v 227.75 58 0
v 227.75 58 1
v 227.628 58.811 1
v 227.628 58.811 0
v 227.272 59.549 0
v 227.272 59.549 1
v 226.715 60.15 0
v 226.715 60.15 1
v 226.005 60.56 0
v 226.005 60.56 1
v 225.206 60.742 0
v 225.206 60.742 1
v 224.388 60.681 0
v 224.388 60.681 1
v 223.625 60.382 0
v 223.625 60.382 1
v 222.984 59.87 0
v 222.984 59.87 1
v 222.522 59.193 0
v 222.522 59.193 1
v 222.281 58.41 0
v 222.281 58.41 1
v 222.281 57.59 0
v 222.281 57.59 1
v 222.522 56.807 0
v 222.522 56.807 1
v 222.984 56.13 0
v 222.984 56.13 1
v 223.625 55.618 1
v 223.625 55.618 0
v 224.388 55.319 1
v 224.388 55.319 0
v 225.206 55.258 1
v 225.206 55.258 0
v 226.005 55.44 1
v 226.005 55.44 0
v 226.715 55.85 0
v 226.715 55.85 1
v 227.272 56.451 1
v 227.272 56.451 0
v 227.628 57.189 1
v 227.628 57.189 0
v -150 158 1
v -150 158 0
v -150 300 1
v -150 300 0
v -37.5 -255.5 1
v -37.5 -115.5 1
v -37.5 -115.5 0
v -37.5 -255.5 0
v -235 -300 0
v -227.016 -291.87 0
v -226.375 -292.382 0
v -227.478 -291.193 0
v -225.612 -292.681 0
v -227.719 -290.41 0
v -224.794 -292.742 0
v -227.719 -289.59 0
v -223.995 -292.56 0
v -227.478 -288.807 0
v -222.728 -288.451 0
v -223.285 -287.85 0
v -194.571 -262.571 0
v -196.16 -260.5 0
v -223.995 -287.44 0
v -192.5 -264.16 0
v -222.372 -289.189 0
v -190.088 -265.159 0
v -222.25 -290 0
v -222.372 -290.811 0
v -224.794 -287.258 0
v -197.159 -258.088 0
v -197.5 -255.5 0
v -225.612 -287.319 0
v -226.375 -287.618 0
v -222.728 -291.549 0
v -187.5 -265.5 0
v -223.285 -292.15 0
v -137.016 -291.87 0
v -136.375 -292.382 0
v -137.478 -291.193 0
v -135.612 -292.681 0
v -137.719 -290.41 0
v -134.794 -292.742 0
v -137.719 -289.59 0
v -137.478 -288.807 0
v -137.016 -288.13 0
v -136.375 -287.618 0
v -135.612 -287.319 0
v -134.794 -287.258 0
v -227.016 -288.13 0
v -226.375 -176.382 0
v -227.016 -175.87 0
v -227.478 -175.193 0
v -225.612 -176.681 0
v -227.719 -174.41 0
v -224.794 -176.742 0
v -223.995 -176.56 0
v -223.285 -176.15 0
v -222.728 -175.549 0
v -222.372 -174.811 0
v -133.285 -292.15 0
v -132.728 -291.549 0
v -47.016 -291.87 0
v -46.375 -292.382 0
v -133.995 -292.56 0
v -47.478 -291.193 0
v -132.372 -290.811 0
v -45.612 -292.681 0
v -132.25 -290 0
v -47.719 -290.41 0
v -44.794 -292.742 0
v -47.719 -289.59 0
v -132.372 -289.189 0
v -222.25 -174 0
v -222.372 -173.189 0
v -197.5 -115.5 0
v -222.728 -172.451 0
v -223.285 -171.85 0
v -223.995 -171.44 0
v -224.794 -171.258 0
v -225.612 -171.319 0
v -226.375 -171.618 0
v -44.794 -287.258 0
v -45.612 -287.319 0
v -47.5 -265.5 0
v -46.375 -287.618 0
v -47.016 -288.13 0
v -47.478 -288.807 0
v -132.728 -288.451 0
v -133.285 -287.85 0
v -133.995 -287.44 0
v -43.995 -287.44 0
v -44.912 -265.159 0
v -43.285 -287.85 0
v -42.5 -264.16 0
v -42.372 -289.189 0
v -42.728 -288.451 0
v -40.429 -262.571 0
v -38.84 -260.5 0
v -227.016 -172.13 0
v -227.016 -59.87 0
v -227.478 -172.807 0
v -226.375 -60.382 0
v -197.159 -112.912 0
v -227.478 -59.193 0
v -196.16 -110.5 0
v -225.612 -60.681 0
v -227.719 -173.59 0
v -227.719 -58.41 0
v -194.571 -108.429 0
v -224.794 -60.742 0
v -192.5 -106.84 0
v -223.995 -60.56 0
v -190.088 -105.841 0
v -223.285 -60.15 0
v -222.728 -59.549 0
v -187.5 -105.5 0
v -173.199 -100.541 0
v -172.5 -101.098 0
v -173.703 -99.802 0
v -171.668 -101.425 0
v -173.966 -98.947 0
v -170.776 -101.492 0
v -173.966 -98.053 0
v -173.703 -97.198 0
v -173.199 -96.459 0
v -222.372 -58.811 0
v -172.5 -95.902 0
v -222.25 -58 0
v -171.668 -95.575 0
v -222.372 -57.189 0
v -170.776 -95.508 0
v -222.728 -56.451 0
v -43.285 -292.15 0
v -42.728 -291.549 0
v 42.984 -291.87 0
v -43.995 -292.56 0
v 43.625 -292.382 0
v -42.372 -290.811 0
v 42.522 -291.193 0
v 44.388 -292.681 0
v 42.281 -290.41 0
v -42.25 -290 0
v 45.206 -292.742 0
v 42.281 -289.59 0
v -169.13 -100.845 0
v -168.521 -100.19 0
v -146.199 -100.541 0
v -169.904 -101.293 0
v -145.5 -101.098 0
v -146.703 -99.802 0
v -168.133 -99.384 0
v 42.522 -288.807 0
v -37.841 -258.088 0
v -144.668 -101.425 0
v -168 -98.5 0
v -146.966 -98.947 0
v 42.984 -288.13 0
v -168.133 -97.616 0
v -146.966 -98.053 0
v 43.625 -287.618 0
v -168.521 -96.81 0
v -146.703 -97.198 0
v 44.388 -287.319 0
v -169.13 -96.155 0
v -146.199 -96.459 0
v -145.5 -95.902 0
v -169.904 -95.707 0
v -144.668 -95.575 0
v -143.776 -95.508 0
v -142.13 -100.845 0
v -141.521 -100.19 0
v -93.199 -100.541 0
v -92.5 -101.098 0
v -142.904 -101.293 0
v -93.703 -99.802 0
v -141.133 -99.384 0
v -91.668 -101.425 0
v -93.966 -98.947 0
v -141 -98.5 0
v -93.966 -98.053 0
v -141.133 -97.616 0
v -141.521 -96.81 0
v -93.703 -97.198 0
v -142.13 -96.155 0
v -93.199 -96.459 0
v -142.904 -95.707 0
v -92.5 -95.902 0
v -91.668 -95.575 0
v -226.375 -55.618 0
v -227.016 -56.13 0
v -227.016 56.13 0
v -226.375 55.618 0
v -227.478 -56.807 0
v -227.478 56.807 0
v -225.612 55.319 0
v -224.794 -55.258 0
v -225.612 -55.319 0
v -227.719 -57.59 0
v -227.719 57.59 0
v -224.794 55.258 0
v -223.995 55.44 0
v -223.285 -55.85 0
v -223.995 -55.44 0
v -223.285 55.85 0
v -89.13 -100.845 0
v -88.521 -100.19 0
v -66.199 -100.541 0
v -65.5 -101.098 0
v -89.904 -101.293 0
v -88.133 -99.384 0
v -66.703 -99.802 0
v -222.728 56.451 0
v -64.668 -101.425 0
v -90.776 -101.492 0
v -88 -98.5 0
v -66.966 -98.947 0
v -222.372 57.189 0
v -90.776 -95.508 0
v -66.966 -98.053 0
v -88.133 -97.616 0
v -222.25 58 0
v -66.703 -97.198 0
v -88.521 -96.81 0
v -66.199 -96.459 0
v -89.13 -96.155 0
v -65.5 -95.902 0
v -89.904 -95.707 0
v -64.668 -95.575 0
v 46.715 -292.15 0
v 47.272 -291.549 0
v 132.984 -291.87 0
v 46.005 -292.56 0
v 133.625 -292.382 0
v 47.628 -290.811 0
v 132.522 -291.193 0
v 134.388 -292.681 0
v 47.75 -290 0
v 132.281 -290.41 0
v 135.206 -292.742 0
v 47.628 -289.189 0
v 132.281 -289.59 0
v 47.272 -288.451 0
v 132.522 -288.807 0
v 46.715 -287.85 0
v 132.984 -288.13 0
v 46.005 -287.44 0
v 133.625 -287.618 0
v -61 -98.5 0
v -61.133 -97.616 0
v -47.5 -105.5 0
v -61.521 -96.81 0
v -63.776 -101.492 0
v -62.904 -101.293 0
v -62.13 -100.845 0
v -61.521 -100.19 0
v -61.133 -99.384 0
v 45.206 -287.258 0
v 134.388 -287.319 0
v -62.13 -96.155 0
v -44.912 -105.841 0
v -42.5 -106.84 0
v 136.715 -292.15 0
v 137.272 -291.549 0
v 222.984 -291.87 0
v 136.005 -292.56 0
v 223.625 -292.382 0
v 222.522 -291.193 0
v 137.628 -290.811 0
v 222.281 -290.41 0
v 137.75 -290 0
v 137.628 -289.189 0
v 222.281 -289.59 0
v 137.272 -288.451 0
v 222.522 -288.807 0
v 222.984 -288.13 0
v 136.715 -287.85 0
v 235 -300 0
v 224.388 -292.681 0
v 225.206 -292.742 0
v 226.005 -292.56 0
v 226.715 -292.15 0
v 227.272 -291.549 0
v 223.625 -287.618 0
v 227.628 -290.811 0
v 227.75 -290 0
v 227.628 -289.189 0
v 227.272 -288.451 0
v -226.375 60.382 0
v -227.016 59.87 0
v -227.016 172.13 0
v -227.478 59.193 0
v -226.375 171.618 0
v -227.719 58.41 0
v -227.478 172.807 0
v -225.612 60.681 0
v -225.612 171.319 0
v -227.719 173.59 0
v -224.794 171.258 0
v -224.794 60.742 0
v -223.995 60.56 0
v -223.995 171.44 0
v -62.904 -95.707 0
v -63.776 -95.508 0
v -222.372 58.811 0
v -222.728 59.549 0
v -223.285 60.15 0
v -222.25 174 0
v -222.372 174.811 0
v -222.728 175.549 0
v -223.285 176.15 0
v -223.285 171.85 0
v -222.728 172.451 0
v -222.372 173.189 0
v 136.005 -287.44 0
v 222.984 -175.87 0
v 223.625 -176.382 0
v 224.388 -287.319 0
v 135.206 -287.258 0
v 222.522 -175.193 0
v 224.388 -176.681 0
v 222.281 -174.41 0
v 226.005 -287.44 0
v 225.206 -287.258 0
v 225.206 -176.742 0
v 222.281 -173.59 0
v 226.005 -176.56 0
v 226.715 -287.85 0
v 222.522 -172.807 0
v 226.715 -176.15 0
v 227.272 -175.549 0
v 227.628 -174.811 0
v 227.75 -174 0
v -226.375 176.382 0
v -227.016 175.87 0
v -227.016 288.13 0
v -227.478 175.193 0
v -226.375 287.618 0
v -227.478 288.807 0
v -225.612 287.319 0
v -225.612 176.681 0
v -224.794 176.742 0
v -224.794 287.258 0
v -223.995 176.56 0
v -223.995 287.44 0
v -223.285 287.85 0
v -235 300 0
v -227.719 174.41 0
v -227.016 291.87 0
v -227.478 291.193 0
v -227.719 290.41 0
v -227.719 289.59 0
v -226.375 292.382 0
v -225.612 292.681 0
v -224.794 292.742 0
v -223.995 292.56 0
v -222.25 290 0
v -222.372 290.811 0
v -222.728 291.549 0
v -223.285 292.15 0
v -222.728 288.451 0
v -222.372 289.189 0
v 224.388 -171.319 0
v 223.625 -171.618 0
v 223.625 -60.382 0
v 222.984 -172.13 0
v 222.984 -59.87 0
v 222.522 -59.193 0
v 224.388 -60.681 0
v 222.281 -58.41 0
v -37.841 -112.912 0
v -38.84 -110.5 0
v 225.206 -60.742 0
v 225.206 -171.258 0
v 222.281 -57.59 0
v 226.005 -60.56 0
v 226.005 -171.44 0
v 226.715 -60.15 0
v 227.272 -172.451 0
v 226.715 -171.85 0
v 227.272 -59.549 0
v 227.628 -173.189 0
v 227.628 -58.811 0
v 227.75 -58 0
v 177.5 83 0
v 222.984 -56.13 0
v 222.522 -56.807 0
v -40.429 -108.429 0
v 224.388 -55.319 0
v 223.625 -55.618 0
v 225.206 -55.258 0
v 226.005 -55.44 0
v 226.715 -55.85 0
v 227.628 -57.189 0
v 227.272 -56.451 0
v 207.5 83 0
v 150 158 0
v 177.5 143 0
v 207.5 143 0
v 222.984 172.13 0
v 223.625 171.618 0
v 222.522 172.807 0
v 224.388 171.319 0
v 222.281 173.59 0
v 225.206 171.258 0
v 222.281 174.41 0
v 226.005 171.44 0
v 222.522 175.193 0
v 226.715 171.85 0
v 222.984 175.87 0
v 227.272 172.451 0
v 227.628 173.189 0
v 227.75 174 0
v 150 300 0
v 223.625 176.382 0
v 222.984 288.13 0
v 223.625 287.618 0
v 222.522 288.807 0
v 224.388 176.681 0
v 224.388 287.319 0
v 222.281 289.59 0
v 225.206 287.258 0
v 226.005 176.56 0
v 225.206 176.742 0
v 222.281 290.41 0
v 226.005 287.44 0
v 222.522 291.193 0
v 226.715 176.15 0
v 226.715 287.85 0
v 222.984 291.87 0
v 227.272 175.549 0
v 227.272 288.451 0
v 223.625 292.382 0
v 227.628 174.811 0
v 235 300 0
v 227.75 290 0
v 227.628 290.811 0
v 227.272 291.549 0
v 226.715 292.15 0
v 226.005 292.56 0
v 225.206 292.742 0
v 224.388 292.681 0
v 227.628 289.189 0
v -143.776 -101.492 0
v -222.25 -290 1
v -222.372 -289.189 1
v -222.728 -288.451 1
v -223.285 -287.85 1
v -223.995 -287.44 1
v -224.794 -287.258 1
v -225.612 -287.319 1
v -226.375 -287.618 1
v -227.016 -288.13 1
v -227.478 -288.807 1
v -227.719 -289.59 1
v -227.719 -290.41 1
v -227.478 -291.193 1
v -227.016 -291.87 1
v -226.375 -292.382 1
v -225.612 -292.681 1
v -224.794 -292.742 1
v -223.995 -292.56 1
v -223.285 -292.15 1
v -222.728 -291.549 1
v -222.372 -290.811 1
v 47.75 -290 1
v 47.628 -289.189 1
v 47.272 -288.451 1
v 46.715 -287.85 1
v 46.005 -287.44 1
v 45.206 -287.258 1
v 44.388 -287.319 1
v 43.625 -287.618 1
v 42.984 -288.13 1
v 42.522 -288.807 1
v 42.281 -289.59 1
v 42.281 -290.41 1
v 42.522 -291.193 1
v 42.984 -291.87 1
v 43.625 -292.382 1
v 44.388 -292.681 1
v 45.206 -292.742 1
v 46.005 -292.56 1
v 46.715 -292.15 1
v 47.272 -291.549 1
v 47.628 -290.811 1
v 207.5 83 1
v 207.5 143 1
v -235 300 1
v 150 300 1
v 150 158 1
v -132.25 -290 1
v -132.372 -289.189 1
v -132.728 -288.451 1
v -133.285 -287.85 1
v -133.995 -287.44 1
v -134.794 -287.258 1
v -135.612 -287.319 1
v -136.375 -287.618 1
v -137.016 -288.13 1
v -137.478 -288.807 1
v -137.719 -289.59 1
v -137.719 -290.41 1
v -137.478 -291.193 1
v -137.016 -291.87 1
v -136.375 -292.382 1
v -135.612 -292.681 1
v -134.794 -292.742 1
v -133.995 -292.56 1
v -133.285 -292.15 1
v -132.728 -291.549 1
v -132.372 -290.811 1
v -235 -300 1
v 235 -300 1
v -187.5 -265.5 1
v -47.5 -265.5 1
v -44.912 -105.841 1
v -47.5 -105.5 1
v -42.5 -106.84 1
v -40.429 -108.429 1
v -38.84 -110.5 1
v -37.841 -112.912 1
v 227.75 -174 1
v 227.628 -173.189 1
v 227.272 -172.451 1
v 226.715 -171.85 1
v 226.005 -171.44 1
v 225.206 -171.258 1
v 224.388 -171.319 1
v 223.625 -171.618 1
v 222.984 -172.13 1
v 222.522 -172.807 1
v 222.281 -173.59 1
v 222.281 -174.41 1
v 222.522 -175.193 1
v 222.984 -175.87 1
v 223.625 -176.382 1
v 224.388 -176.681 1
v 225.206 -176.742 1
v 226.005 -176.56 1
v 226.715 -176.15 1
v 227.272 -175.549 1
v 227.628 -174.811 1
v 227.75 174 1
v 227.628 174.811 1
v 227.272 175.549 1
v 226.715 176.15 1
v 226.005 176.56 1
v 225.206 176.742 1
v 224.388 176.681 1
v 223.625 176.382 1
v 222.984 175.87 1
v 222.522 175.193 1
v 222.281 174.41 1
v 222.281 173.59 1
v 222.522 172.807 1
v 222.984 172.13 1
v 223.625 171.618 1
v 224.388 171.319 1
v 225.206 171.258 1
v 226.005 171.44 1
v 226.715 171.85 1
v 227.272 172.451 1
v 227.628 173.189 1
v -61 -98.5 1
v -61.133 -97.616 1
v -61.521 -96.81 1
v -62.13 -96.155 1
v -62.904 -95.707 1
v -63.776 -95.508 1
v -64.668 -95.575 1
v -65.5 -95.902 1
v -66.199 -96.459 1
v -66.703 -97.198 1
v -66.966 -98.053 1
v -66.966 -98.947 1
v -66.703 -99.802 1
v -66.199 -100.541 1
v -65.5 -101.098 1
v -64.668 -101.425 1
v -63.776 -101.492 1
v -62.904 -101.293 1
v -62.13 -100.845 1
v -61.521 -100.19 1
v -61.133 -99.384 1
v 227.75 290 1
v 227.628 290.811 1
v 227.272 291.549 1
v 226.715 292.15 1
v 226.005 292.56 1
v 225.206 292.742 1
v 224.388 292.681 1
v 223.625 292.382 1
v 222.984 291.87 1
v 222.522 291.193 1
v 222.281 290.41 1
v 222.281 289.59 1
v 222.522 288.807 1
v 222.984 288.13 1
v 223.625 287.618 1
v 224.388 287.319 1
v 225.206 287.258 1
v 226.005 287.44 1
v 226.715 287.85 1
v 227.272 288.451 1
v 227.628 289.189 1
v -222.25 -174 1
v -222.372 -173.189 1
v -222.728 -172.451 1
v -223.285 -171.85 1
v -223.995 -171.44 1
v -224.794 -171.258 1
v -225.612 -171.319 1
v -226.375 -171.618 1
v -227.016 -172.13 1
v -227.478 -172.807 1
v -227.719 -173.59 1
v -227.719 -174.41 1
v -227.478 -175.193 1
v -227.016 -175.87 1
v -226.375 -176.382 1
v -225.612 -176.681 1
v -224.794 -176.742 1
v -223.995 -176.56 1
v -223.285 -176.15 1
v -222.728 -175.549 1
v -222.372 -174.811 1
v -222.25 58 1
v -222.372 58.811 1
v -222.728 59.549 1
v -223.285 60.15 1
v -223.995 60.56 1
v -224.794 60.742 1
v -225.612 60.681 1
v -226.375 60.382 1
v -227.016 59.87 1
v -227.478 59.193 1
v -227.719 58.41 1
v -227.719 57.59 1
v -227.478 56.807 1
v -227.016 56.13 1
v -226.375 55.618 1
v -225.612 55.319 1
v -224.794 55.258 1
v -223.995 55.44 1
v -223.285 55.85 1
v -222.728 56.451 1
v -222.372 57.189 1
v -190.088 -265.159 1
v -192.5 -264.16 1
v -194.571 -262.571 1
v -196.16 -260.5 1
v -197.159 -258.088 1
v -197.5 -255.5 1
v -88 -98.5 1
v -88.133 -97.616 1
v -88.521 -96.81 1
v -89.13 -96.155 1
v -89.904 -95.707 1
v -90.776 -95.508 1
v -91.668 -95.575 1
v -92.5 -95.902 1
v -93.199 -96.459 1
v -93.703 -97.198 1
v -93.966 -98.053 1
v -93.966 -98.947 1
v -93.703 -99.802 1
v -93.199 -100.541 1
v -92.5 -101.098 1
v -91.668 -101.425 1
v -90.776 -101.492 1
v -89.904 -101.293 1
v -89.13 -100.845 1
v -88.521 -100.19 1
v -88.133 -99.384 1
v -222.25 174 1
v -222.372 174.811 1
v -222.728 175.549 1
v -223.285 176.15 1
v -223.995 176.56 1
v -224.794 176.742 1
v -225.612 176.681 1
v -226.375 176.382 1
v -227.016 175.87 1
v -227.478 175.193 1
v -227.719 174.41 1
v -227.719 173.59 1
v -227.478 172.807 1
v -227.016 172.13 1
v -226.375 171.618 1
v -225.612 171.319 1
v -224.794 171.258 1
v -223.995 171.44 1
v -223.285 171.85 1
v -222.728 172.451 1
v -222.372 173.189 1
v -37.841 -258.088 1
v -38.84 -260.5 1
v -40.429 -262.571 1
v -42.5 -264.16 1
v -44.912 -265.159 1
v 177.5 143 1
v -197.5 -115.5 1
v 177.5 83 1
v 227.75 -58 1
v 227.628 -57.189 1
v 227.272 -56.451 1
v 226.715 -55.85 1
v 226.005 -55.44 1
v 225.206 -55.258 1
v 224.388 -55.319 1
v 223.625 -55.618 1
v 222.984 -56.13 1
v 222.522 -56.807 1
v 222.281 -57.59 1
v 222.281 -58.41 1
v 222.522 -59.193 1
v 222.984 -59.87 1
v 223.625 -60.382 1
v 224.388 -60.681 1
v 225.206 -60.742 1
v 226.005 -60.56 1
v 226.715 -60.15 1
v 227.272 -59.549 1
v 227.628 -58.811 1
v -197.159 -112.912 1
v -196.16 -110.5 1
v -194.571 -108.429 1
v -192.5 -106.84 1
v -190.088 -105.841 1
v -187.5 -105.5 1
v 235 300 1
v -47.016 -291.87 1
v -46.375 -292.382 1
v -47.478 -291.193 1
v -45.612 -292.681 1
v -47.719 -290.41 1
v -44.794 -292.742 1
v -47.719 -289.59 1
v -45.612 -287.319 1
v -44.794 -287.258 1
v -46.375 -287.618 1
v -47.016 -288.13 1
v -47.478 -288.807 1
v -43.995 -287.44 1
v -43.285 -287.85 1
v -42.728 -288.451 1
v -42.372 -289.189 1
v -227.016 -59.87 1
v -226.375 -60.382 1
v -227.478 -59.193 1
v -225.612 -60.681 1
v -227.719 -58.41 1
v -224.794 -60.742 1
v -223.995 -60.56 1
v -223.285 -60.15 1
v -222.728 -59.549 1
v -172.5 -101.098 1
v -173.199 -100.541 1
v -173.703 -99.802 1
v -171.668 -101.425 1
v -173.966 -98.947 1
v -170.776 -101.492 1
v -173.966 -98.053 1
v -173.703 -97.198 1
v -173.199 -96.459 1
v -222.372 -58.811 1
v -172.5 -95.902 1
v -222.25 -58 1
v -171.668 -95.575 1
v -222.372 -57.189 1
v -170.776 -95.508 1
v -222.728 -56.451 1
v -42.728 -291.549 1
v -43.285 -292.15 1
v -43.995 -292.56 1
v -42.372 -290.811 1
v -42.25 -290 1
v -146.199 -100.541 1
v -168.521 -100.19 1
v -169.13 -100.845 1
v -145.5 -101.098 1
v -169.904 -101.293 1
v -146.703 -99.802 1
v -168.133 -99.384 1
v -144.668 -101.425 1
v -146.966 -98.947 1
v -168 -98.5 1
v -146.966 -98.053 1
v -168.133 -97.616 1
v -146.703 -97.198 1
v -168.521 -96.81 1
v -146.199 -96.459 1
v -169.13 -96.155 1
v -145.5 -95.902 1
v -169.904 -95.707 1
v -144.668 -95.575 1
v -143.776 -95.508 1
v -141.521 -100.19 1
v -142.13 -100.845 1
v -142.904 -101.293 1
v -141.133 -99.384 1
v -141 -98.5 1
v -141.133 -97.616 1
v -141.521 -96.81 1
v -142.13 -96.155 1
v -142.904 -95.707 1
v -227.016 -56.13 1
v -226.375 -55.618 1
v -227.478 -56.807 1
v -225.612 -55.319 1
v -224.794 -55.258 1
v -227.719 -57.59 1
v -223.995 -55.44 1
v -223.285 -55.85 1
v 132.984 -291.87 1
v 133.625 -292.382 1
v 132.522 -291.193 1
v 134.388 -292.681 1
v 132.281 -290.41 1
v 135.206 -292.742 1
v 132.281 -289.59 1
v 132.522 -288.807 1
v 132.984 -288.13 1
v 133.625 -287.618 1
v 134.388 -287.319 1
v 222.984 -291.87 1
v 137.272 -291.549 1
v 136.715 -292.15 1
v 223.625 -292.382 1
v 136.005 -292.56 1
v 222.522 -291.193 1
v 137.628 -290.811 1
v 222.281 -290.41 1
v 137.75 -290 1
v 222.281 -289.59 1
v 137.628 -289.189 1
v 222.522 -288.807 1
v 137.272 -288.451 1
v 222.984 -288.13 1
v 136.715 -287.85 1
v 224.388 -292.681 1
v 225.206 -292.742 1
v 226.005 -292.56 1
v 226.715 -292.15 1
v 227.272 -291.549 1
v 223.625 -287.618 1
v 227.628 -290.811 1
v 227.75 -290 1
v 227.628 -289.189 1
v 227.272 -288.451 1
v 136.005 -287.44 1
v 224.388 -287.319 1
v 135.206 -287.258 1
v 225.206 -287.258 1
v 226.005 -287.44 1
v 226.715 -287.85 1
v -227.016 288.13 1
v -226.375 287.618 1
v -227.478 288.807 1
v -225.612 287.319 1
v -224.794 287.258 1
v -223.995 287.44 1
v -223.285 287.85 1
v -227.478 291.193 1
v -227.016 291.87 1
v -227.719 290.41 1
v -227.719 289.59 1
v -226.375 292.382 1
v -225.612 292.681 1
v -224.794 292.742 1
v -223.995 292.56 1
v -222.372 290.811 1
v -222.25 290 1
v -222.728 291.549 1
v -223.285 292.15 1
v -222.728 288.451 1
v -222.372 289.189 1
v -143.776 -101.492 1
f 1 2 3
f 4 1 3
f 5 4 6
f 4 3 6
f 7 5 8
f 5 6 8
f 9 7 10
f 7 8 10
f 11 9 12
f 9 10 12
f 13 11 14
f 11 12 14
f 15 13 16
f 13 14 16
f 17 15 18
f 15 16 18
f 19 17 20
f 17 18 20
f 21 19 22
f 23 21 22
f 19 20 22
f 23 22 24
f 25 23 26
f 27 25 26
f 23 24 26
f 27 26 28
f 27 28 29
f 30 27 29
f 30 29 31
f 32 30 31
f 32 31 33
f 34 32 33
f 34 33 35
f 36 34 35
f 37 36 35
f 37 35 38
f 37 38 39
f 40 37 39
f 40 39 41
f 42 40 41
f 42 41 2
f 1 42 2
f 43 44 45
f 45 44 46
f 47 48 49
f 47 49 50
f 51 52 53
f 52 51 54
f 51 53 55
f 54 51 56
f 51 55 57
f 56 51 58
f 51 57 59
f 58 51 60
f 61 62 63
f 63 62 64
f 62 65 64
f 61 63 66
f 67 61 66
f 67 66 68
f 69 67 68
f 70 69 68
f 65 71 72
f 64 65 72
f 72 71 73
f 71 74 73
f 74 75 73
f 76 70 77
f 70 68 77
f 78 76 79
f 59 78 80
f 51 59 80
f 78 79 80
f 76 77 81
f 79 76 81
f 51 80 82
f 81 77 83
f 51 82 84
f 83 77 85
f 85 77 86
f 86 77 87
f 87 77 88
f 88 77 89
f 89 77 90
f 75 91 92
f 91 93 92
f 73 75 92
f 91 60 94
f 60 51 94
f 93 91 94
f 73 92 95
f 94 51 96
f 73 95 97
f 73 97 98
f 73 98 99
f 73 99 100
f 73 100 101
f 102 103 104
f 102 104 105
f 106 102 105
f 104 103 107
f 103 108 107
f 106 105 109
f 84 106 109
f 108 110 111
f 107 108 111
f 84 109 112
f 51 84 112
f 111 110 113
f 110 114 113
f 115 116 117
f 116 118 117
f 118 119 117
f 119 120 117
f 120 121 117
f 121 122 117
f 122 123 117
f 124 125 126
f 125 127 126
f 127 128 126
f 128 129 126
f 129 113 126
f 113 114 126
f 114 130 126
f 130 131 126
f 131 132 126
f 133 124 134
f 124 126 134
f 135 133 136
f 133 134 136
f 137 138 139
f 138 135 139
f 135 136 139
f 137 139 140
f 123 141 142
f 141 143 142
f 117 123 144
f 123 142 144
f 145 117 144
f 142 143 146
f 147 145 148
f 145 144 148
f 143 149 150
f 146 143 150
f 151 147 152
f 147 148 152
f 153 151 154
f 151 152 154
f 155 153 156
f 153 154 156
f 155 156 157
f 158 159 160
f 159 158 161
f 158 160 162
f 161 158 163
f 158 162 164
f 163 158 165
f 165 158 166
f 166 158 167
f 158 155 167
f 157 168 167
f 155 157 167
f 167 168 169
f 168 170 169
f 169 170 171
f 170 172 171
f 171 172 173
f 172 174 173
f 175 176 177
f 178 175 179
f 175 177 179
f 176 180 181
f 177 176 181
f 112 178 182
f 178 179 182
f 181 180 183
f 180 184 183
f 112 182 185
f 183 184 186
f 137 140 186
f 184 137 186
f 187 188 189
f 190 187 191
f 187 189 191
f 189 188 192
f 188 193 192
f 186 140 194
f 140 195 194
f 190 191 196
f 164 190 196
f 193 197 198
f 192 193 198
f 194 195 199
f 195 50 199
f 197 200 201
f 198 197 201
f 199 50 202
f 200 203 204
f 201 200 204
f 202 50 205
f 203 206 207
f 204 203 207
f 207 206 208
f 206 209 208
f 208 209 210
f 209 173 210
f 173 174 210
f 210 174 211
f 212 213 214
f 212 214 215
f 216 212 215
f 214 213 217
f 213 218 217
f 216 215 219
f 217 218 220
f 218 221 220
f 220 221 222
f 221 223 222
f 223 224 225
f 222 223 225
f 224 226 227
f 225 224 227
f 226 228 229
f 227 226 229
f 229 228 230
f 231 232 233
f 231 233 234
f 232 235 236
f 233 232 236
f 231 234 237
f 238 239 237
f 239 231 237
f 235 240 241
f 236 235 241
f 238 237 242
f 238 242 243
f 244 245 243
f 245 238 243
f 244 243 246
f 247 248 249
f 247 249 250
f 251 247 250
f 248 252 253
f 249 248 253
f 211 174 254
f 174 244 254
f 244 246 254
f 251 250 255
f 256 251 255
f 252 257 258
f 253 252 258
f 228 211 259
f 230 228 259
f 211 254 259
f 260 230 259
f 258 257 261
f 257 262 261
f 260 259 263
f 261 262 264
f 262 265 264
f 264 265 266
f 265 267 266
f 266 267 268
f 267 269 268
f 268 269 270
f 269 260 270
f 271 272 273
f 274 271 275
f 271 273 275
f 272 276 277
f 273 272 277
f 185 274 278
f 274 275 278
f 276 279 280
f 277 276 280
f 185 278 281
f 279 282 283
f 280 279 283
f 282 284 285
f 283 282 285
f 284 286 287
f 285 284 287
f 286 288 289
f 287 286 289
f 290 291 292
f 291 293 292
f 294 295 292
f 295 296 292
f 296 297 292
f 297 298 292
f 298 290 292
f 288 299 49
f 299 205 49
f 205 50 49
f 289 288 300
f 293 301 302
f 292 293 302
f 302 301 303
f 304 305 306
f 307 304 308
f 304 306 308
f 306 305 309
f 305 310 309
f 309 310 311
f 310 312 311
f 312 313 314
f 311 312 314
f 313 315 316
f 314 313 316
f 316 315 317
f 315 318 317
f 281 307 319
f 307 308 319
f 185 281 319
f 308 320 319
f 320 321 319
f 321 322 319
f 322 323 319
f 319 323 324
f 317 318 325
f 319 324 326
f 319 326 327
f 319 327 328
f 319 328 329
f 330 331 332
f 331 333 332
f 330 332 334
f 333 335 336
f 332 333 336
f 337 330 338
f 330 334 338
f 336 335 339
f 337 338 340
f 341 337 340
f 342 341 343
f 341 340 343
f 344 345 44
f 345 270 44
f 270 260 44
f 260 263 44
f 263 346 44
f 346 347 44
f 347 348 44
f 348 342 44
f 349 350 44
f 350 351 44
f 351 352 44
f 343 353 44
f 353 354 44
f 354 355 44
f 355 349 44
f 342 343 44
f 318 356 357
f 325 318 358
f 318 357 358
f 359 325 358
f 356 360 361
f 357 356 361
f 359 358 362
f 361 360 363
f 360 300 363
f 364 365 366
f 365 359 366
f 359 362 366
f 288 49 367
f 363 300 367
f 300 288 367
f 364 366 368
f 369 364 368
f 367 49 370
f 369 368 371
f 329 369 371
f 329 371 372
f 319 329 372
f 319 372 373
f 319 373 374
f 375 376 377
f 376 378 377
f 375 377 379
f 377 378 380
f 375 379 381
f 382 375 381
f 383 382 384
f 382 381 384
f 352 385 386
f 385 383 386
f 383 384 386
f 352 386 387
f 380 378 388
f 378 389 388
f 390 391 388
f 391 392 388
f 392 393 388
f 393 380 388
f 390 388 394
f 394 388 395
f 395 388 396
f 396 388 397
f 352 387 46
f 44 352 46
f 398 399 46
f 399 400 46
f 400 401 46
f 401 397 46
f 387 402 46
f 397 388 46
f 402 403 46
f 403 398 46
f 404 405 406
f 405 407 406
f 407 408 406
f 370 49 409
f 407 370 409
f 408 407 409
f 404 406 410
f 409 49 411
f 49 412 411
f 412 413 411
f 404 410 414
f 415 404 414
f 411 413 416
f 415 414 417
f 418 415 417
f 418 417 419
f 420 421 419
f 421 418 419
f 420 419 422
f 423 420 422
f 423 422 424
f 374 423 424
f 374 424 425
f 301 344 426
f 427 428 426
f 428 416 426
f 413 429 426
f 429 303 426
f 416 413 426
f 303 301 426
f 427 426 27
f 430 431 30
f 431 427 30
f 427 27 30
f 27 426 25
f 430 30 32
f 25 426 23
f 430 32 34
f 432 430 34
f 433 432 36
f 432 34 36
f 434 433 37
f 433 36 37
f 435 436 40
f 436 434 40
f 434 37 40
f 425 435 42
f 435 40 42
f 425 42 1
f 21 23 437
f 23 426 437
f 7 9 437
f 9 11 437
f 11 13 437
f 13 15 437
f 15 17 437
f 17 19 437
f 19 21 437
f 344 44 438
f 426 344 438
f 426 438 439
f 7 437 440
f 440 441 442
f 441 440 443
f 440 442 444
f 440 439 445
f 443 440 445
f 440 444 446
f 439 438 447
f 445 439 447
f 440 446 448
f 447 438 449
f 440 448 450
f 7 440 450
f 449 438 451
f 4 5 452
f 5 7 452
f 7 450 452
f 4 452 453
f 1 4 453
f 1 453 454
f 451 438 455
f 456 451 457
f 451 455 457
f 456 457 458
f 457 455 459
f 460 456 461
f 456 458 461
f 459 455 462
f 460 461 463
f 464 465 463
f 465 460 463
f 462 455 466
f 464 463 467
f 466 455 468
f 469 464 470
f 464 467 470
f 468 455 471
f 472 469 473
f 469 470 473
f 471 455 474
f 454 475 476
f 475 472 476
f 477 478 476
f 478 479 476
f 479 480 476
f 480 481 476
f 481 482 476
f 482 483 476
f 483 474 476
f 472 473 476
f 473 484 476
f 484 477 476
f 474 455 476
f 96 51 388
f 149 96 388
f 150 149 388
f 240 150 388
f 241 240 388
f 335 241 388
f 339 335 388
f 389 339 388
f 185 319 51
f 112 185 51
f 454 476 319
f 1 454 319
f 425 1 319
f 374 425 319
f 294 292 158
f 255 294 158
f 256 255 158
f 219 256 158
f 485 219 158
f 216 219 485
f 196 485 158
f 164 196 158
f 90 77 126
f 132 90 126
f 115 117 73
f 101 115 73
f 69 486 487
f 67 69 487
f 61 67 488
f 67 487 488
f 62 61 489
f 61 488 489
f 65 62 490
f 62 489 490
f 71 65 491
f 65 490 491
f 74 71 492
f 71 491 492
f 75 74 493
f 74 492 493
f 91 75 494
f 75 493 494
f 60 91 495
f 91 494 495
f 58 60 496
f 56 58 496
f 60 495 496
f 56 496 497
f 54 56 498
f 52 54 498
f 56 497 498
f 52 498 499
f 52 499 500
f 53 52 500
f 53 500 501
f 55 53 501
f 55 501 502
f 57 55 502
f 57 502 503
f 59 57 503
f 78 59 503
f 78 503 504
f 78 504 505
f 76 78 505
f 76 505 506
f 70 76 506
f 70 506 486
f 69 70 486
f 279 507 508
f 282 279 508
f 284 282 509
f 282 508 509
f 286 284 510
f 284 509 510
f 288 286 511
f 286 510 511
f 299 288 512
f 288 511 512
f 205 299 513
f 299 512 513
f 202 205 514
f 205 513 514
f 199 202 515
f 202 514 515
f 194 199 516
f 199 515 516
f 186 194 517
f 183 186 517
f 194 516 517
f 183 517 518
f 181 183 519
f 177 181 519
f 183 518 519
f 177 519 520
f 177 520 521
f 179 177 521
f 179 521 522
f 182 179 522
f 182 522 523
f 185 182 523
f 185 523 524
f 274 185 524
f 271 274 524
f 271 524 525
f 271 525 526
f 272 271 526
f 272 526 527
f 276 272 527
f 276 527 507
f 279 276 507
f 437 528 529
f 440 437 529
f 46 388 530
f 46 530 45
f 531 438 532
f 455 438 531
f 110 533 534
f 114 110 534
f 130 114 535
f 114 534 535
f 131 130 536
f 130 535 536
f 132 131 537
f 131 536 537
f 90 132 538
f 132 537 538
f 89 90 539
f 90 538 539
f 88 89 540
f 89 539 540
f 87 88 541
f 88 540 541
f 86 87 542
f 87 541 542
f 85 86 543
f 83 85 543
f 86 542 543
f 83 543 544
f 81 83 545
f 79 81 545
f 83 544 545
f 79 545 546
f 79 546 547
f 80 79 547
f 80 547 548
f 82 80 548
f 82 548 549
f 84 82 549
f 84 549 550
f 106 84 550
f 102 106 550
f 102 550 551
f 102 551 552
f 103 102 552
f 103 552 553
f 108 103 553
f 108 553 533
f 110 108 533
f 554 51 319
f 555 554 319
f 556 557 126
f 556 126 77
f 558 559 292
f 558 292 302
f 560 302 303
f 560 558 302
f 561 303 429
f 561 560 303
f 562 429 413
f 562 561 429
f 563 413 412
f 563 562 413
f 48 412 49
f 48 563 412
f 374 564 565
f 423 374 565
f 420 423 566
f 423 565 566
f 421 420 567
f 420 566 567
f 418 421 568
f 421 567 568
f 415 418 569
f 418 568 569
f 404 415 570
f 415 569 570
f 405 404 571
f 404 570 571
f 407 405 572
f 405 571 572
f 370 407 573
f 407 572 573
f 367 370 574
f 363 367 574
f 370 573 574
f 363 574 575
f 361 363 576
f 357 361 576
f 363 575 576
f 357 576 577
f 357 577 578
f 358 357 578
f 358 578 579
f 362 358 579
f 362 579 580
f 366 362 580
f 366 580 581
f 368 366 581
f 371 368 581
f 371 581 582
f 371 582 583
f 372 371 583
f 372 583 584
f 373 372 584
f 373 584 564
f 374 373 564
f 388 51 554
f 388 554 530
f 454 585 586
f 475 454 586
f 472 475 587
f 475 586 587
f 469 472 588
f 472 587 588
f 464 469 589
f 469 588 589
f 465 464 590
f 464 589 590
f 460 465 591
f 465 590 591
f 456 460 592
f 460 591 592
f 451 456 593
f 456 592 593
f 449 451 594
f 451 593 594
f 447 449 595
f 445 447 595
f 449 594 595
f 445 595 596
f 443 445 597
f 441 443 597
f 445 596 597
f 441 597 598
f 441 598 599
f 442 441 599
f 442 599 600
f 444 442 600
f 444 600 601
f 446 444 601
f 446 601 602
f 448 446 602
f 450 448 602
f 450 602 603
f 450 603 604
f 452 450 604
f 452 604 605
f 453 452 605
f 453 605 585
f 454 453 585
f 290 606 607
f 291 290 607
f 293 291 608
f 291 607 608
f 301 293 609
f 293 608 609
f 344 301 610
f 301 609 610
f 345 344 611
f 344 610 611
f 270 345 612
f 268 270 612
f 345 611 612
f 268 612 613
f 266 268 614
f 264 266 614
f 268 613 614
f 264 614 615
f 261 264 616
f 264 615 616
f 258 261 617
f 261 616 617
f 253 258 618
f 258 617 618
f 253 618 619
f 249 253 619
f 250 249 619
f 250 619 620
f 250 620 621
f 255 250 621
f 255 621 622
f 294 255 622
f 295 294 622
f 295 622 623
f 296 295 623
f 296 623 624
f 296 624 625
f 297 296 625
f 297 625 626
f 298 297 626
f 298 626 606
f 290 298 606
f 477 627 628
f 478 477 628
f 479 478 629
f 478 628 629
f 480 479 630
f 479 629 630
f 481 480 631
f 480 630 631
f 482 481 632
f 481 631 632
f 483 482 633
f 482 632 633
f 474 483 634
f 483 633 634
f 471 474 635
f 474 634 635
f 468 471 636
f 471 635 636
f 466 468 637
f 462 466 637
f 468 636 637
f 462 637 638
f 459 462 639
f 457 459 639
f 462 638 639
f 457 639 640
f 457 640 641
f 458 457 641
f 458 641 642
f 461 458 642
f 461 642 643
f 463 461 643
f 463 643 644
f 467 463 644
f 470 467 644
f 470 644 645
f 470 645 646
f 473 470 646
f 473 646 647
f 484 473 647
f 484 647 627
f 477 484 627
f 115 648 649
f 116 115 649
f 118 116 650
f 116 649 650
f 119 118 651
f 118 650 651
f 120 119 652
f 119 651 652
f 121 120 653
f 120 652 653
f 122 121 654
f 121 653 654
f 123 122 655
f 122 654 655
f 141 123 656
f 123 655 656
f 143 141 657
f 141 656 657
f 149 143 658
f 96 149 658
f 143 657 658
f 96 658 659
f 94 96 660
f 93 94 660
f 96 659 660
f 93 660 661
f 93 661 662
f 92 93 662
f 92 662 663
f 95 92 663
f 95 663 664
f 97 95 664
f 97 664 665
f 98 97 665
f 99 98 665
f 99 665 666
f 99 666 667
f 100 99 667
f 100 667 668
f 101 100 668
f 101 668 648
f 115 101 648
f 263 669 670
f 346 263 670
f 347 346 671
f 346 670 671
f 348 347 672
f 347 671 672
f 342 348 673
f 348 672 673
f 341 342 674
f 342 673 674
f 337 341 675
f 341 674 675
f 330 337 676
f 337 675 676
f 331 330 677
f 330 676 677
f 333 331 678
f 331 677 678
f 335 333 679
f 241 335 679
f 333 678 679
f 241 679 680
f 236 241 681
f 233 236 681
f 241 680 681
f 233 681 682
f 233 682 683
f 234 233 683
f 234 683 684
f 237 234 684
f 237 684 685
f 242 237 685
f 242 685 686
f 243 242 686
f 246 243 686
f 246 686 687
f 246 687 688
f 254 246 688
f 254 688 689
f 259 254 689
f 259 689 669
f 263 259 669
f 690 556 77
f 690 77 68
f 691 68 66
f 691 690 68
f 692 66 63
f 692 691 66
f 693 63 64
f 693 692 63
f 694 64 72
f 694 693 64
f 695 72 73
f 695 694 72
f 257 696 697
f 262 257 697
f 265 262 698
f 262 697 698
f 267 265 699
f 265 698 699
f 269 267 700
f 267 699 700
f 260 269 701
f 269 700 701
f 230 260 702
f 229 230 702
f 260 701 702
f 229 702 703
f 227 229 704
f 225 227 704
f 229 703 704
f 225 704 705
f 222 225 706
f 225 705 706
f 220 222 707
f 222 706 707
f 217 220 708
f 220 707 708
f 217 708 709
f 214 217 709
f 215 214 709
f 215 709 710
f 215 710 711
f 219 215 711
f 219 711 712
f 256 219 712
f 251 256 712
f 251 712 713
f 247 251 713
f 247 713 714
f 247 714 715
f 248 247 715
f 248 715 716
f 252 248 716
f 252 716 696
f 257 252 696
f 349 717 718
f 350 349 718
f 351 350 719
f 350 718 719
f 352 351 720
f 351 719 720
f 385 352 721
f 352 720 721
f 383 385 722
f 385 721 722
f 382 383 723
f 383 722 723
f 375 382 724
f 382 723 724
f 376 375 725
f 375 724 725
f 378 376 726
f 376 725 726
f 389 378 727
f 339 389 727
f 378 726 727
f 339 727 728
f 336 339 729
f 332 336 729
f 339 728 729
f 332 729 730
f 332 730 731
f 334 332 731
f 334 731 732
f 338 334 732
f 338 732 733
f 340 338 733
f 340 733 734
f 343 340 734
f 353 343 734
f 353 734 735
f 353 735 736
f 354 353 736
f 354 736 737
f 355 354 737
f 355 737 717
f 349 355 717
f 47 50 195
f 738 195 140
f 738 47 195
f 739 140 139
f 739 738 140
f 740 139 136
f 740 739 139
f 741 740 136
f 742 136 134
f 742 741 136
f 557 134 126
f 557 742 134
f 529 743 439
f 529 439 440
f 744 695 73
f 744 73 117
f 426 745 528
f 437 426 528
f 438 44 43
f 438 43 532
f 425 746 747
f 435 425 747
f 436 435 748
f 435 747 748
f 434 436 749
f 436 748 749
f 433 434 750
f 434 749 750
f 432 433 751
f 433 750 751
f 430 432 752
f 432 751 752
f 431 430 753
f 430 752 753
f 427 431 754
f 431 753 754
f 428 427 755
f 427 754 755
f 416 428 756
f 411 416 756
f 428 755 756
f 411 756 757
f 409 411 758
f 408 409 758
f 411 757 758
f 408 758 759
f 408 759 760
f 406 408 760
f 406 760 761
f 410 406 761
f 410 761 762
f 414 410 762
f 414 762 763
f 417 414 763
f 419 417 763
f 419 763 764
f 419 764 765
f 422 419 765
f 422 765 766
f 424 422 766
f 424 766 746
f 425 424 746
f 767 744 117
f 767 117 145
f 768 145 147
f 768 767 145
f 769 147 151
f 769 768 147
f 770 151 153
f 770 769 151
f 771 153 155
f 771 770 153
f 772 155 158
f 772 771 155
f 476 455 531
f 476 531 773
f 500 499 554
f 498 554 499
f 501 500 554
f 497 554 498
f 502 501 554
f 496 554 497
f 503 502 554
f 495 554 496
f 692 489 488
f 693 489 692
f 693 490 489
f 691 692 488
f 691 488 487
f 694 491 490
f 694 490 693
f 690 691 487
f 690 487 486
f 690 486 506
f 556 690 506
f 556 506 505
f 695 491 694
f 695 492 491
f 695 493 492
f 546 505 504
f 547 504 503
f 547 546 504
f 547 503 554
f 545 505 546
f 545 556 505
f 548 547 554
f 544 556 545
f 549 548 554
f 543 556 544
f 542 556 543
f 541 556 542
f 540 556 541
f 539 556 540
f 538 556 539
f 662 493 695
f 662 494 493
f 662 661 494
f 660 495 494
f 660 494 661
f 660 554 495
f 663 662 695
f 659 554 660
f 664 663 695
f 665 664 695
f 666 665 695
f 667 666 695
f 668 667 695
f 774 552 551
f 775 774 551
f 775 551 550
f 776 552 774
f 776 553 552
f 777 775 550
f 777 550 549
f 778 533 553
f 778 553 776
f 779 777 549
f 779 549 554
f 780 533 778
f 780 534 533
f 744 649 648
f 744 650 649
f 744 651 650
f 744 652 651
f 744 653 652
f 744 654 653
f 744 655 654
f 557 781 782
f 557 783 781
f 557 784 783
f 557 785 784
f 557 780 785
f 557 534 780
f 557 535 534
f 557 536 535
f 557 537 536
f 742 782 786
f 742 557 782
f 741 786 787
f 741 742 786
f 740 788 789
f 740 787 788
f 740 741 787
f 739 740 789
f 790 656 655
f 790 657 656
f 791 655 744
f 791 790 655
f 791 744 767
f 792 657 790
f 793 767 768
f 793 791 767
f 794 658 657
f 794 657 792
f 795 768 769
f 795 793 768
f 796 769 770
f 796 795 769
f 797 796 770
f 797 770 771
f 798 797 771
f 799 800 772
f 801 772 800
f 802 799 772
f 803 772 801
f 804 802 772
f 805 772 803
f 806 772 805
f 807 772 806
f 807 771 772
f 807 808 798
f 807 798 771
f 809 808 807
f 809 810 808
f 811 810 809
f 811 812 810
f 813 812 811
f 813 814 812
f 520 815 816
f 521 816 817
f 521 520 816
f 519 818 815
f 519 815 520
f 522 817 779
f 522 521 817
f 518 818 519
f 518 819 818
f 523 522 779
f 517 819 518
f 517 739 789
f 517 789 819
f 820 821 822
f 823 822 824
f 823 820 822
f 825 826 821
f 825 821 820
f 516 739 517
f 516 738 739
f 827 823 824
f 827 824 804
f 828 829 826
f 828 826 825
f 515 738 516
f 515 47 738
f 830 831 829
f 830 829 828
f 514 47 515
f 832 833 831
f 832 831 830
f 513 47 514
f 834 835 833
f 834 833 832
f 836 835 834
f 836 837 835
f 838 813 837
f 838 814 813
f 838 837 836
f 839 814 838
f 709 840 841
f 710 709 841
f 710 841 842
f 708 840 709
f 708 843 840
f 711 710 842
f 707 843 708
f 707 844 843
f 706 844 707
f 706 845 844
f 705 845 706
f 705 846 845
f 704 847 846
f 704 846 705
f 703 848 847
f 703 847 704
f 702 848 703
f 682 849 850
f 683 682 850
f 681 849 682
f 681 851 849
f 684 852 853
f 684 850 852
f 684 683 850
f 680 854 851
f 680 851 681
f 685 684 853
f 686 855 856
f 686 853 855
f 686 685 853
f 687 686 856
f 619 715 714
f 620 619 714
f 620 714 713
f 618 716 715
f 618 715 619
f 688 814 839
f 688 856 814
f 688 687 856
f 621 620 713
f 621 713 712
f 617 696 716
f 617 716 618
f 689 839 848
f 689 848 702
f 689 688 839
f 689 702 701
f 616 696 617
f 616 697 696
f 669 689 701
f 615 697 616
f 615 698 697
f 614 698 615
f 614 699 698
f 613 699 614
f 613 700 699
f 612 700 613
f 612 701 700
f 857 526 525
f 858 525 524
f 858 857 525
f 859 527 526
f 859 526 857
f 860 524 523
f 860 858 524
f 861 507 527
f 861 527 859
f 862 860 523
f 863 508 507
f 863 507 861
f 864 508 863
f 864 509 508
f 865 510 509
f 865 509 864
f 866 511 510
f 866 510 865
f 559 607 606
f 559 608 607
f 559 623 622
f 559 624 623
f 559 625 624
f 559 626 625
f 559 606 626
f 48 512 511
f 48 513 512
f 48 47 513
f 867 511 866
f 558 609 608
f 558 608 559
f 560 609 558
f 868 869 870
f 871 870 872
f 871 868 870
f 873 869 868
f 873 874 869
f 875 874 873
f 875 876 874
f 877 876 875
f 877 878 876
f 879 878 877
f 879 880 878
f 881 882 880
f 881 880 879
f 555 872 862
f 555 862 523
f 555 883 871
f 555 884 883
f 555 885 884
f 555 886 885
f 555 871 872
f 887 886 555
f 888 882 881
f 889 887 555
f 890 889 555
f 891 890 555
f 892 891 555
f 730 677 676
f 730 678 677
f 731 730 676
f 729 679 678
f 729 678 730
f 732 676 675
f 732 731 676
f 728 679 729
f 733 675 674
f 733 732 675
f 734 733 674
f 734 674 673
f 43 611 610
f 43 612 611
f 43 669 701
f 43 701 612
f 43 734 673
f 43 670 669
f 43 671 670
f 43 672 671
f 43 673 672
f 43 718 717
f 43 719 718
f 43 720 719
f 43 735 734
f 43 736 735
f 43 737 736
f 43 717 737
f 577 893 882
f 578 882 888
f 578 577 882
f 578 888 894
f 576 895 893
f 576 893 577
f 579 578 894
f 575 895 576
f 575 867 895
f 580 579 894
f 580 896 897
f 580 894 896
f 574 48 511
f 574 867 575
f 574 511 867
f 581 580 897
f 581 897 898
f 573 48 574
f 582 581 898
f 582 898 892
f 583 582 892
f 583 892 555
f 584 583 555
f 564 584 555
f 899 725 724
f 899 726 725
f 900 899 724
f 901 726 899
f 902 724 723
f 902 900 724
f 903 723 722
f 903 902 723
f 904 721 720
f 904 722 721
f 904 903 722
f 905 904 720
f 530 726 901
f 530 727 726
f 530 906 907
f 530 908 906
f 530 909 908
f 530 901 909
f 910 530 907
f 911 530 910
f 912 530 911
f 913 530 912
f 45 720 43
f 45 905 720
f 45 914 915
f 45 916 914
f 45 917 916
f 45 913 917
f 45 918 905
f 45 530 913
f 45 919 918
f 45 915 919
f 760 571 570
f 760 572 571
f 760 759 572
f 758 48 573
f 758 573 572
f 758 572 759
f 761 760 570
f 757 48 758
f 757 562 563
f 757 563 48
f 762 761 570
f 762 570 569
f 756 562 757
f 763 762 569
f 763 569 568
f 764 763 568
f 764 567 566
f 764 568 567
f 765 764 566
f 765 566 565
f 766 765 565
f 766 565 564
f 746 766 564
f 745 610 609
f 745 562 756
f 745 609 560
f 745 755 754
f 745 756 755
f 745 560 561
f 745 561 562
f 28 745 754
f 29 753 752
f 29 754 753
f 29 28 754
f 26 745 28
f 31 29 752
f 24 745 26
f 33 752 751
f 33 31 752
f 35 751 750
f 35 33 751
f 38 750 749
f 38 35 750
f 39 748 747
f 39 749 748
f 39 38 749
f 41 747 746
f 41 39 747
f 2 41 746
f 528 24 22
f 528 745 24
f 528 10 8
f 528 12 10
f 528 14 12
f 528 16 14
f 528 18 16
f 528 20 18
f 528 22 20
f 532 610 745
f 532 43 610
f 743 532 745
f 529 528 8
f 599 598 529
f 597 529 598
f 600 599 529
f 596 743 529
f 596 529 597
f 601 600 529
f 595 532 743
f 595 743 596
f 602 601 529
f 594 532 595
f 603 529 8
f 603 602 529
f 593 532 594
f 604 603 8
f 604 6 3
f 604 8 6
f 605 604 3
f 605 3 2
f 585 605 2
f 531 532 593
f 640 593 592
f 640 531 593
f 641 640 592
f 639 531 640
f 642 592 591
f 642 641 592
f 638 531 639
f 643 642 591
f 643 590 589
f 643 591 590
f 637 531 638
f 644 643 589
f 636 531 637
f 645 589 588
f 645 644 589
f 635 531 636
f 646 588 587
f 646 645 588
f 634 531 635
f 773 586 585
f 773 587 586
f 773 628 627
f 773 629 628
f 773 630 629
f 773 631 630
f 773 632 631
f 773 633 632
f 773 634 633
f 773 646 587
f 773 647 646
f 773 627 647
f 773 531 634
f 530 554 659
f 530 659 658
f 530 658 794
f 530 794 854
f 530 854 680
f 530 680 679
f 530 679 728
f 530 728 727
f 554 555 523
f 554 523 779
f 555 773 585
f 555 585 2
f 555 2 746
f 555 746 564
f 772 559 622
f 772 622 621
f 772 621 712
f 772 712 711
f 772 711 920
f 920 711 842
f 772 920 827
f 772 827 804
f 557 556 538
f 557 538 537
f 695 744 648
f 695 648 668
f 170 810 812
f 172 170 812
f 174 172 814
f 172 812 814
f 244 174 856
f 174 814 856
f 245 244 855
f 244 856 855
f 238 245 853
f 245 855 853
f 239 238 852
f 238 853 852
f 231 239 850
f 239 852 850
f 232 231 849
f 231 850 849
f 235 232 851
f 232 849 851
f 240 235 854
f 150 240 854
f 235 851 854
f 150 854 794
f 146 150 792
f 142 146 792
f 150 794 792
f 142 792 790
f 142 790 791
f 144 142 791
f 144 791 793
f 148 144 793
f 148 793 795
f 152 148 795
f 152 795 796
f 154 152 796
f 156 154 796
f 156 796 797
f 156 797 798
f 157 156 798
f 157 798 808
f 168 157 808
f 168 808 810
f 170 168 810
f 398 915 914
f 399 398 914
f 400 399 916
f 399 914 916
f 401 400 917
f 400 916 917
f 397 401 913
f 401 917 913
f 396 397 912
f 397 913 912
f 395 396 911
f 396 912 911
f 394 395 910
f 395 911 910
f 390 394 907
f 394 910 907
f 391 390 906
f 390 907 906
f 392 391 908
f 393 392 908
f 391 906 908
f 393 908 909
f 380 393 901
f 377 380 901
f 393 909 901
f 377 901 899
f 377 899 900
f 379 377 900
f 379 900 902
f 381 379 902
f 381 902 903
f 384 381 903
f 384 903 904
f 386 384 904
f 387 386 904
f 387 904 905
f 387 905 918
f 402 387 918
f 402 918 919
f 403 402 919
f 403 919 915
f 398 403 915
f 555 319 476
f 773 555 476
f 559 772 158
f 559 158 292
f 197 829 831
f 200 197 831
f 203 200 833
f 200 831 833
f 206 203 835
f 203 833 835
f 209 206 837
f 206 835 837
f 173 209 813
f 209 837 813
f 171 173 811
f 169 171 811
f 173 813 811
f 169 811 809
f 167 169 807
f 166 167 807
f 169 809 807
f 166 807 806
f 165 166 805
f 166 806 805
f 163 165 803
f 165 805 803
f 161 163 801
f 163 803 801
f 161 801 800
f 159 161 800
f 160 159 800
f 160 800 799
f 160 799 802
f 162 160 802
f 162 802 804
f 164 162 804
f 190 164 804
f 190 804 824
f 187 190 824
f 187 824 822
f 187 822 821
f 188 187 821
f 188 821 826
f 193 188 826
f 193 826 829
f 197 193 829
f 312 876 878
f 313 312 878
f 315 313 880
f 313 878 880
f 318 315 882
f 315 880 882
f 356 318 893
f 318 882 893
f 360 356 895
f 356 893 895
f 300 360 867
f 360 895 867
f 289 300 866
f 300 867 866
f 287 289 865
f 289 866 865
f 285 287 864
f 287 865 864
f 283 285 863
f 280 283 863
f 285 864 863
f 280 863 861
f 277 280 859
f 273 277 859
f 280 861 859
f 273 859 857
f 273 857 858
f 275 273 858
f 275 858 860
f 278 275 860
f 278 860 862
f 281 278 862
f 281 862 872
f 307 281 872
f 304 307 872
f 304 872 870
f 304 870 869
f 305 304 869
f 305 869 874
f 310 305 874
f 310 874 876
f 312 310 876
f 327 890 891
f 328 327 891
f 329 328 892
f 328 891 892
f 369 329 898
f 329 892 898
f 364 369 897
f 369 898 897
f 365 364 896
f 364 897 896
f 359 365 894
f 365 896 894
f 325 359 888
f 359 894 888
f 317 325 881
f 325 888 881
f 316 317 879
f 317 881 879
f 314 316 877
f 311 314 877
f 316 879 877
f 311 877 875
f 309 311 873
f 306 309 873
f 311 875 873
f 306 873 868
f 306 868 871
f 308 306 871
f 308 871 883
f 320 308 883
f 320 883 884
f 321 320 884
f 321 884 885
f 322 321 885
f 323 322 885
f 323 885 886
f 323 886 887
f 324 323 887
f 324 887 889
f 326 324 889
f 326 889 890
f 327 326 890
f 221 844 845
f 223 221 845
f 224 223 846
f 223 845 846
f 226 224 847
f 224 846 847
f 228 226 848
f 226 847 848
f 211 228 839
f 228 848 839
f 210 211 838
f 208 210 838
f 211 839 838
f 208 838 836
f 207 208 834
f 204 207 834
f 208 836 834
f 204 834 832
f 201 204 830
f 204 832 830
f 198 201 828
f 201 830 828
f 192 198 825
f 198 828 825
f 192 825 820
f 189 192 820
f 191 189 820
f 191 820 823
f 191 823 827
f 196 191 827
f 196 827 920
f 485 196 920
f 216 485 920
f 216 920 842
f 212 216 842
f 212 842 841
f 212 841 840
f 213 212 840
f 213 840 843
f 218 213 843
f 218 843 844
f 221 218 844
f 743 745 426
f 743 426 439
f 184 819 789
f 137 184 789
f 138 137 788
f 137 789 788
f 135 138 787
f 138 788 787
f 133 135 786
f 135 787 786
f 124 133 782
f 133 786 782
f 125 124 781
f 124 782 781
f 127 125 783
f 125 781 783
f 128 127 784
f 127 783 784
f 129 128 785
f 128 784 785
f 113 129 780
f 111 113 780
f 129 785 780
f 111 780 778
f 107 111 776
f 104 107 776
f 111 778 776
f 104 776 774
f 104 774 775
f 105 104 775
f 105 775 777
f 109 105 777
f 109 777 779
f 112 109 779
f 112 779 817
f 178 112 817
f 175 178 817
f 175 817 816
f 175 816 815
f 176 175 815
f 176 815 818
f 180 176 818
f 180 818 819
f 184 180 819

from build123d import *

# Parameters (mm, degrees)
SKETCH_1_W          = 470
SKETCH_1_H          = 600
EXTRUDE_1_DEPTH     = 1
HOLE_WIZARD_M5_1_D  = 5.5
SKETCH_1_3_W        = 300
SKETCH_1_3_H        = 142
CUT_EXTRUDE_3_DEPTH = 10
SKETCH_4_W          = 30
SKETCH_4_H          = 60
CUT_EXTRUDE_4_DEPTH = 10
SKETCH_5_R          = 3
CUT_EXTRUDE_5_DEPTH = 10


with BuildPart() as part:
    # 스케치1 → 보스-돌출1 (new body)
    with BuildSketch(Plane.XY):
        Rectangle(SKETCH_1_W, SKETCH_1_H)
    extrude(amount=EXTRUDE_1_DEPTH)

    # M5 여유 구멍1 (through all)
    with Locations(Plane(origin=(0, 0, 0), x_dir=(-1, 0, 0), z_dir=(0, 0, -1))):
        with Locations((-225, 290), (-135, 290), (-45, 290), (45, 290), (135, 290), (225, 290), (225, 174), (225, 58), (225, -58), (225, -174), (225, -290), (-225, 174), (-225, 58), (-225, -58), (-225, -174), (-225, -290), (-135, -290), (-45, -290), (45, -290), (135, -290)):
            Hole(HOLE_WIZARD_M5_1_D / 2)

    # 스케치1<3> → 컷-돌출3 (cut)
    with BuildSketch(Plane.XY):
        with Locations((0, 229)):
            Rectangle(SKETCH_1_3_W, SKETCH_1_3_H)
    extrude(amount=CUT_EXTRUDE_3_DEPTH, mode=Mode.SUBTRACT)

    # 스케치4 → 컷-돌출4 (cut)
    with BuildSketch(Plane.XY.offset(1)):
        with Locations((192.5, 113)):
            Rectangle(SKETCH_4_W, SKETCH_4_H)
        with BuildLine():
            Line((-187.5, -105.5), (-47.5, -105.5))
            ThreePointArc((-47.5, -105.5), (-40.428932188, -108.428932188), (-37.5, -115.5))
            Line((-37.5, -115.5), (-37.5, -255.5))
            ThreePointArc((-37.5, -255.5), (-40.428932188, -262.571067812), (-47.5, -265.5))
            Line((-47.5, -265.5), (-187.5, -265.5))
            ThreePointArc((-187.5, -265.5), (-194.571067812, -262.571067812), (-197.5, -255.5))
            Line((-197.5, -255.5), (-197.5, -115.5))
            ThreePointArc((-197.5, -115.5), (-194.571067812, -108.428932188), (-187.5, -105.5))
        make_face()
    extrude(amount=-CUT_EXTRUDE_4_DEPTH, mode=Mode.SUBTRACT)

    # 스케치5 → 컷-돌출5 (cut)
    with BuildSketch(Plane.XY.offset(1)):
        with Locations((-171, -98.5)):
            Circle(SKETCH_5_R)
        with Locations((-144, -98.5)):
            Circle(SKETCH_5_R)
        with Locations((-91, -98.5)):
            Circle(SKETCH_5_R)
        with Locations((-64, -98.5)):
            Circle(SKETCH_5_R)
    extrude(amount=-CUT_EXTRUDE_5_DEPTH, mode=Mode.SUBTRACT)


solid = part.part
